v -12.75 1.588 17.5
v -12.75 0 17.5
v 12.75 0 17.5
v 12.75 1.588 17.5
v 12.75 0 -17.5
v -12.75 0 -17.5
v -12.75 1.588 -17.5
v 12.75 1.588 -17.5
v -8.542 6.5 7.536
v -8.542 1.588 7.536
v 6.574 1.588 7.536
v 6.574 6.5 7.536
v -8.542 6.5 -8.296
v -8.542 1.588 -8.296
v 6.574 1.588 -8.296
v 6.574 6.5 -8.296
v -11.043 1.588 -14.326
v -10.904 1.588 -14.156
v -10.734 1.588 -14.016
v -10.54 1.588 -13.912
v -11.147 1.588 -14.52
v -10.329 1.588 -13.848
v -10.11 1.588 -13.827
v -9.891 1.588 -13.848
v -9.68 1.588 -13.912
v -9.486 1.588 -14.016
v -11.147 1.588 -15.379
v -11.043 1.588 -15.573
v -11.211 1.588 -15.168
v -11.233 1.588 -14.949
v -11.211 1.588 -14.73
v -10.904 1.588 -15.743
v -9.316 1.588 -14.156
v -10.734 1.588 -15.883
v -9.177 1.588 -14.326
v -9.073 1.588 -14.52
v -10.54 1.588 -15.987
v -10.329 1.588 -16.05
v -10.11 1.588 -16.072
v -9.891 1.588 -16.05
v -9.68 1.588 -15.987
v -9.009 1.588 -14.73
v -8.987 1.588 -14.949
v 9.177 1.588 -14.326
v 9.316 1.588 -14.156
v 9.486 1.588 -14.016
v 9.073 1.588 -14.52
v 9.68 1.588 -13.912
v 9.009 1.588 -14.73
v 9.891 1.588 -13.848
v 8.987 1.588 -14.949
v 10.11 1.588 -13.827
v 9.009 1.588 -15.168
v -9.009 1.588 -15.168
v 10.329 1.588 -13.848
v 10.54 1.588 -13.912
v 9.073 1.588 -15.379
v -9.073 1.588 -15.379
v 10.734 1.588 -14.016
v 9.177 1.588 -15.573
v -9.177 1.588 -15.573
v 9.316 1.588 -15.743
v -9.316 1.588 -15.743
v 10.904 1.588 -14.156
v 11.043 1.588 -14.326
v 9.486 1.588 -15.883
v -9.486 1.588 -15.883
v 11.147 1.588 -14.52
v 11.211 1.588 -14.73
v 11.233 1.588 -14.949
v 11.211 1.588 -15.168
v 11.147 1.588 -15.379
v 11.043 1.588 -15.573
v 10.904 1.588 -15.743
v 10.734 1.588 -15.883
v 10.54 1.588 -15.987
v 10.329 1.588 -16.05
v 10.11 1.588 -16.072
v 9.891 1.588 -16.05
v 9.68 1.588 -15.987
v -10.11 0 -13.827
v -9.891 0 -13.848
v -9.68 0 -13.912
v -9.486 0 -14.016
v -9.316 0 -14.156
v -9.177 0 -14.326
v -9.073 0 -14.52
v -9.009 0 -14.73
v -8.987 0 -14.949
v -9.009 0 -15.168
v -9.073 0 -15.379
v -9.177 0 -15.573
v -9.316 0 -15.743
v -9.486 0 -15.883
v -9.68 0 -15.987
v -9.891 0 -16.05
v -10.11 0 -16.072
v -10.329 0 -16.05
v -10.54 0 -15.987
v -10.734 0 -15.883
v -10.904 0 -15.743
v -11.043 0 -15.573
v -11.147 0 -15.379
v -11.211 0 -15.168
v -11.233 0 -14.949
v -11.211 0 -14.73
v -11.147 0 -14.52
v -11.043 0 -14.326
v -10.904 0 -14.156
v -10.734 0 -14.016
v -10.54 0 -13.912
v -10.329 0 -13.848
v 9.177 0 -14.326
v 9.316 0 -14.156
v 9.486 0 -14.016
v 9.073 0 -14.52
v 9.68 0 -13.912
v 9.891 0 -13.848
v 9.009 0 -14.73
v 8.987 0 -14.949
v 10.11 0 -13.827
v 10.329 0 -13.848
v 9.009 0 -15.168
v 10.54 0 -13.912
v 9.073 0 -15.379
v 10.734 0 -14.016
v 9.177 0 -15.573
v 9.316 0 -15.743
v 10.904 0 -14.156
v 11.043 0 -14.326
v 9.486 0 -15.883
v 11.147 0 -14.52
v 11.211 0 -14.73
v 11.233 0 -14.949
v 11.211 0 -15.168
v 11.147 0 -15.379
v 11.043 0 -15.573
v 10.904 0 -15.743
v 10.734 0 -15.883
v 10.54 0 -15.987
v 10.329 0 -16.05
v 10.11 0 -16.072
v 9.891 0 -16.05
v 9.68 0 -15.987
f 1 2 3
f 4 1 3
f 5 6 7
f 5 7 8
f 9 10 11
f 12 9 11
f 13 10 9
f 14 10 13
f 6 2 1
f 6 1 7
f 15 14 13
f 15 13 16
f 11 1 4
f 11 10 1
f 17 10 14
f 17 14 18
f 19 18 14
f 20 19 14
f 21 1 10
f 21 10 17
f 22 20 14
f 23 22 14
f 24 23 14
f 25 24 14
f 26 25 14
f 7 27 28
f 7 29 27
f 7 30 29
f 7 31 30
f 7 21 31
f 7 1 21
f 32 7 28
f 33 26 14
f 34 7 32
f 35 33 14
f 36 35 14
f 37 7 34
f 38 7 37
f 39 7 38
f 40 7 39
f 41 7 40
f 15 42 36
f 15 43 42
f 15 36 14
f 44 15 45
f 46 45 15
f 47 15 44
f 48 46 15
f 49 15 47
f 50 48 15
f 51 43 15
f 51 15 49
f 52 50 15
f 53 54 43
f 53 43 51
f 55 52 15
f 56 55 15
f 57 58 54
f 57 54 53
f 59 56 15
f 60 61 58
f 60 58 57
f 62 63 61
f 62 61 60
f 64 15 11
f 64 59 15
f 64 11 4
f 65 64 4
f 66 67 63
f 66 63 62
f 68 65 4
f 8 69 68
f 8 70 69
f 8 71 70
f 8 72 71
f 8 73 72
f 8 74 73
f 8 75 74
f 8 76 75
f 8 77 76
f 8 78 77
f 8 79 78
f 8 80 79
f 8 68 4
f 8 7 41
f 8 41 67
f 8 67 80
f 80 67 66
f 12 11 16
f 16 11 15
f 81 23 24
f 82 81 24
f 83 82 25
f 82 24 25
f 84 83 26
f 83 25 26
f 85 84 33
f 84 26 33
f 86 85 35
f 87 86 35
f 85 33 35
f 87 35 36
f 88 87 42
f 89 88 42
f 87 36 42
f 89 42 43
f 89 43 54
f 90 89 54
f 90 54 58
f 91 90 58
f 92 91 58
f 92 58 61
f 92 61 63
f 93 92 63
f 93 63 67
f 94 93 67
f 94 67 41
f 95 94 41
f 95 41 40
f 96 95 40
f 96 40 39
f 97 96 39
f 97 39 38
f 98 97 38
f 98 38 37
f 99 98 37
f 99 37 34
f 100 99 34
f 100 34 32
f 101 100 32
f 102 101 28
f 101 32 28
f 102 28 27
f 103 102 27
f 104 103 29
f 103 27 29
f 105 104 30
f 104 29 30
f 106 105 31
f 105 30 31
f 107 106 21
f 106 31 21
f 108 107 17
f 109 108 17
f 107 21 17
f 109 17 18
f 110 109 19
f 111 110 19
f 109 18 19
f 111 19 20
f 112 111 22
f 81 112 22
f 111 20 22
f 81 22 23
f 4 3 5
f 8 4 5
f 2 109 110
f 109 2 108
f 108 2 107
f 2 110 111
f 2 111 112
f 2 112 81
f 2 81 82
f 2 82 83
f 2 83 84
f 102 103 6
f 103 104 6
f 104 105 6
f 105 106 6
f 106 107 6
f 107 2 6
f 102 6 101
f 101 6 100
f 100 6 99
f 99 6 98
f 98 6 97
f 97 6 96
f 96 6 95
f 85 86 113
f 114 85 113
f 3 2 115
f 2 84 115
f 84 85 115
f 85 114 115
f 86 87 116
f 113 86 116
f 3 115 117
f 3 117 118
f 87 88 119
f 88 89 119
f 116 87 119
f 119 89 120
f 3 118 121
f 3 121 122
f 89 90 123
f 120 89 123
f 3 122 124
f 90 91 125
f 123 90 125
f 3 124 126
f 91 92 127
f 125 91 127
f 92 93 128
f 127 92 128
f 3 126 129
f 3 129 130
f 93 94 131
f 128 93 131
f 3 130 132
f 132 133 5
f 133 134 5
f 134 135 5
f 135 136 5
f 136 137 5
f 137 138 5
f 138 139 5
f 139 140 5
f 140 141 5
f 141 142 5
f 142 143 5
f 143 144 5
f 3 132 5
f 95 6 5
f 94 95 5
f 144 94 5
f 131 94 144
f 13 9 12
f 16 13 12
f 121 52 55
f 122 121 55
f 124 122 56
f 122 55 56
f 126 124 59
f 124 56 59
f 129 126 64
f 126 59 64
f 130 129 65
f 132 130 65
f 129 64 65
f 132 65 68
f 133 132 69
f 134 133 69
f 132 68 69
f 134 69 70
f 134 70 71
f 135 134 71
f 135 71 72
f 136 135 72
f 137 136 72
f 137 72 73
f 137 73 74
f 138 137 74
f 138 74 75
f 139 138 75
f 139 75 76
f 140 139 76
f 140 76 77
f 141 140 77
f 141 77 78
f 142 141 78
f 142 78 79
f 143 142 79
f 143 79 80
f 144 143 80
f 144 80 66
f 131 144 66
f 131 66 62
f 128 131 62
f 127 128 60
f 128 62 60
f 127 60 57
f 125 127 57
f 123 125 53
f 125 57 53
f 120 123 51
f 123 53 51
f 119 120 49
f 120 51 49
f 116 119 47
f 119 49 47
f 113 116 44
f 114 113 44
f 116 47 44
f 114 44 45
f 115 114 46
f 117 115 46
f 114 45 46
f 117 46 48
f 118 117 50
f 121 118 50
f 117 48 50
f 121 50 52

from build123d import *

# Parameters (mm, degrees)
SKETCH1_W           = 25.5
SKETCH1_H           = 35
BOSS_EXTRUDE1_DEPTH = 1.5875
SKETCH2_W           = 15.116457136
SKETCH2_H           = 15.832029072
BOSS_EXTRUDE2_DEPTH = 4.9125
CUT_EXTRUDE1_REACH  = 24.202
SKETCH3_R           = 1.122559654


with BuildPart() as part:
    # Sketch1 → Boss-Extrude1 (new body)
    with BuildSketch(Plane(origin=(0, 0, 0), x_dir=(1, 0, 0), z_dir=(0, 1, 0))):
        Rectangle(SKETCH1_W, SKETCH1_H)
    extrude(amount=BOSS_EXTRUDE1_DEPTH)

    # Sketch2 → Boss-Extrude2 (add)
    with BuildSketch(Plane(origin=(0, 1.5875, 0), x_dir=(1, 0, 0), z_dir=(0, 1, 0))):
        with Locations((-0.983911411, 0.380147591)):
            Rectangle(SKETCH2_W, SKETCH2_H)
    extrude(amount=BOSS_EXTRUDE2_DEPTH)

    # Sketch3 → Cut-Extrude1 (cut, up to next)
    with BuildSketch(Plane(origin=(0, 1.5875, 0), x_dir=(1, 0, 0), z_dir=(0, 1, 0)), mode=Mode.PRIVATE) as cut_extrude1_sk1:
        with Locations(Location((-10.110032203, 14.949417208, 0), (0, 0, 270))):
            Circle(SKETCH3_R)
    cut_extrude1_tool1 = extrude(cut_extrude1_sk1.sketch, amount=-CUT_EXTRUDE1_REACH, mode=Mode.PRIVATE) & part.part
    # Sketch3 → Cut-Extrude1 (cut, up to next)
    with BuildSketch(Plane(origin=(0, 1.5875, 0), x_dir=(1, 0, 0), z_dir=(0, 1, 0)), mode=Mode.PRIVATE) as cut_extrude1_sk2:
        with Locations(Location((10.110032203, 14.949417208, 0), (0, 0, 270))):
            Circle(SKETCH3_R)
    cut_extrude1_tool2 = extrude(cut_extrude1_sk2.sketch, amount=-CUT_EXTRUDE1_REACH, mode=Mode.PRIVATE) & part.part
    add(cut_extrude1_tool1.solids().sort_by_distance((-10.110032, 1.5875, -14.949417))[0], mode=Mode.SUBTRACT)
    add(cut_extrude1_tool2.solids().sort_by_distance((10.110032, 1.5875, -14.949417))[0], mode=Mode.SUBTRACT)


solid = part.part
